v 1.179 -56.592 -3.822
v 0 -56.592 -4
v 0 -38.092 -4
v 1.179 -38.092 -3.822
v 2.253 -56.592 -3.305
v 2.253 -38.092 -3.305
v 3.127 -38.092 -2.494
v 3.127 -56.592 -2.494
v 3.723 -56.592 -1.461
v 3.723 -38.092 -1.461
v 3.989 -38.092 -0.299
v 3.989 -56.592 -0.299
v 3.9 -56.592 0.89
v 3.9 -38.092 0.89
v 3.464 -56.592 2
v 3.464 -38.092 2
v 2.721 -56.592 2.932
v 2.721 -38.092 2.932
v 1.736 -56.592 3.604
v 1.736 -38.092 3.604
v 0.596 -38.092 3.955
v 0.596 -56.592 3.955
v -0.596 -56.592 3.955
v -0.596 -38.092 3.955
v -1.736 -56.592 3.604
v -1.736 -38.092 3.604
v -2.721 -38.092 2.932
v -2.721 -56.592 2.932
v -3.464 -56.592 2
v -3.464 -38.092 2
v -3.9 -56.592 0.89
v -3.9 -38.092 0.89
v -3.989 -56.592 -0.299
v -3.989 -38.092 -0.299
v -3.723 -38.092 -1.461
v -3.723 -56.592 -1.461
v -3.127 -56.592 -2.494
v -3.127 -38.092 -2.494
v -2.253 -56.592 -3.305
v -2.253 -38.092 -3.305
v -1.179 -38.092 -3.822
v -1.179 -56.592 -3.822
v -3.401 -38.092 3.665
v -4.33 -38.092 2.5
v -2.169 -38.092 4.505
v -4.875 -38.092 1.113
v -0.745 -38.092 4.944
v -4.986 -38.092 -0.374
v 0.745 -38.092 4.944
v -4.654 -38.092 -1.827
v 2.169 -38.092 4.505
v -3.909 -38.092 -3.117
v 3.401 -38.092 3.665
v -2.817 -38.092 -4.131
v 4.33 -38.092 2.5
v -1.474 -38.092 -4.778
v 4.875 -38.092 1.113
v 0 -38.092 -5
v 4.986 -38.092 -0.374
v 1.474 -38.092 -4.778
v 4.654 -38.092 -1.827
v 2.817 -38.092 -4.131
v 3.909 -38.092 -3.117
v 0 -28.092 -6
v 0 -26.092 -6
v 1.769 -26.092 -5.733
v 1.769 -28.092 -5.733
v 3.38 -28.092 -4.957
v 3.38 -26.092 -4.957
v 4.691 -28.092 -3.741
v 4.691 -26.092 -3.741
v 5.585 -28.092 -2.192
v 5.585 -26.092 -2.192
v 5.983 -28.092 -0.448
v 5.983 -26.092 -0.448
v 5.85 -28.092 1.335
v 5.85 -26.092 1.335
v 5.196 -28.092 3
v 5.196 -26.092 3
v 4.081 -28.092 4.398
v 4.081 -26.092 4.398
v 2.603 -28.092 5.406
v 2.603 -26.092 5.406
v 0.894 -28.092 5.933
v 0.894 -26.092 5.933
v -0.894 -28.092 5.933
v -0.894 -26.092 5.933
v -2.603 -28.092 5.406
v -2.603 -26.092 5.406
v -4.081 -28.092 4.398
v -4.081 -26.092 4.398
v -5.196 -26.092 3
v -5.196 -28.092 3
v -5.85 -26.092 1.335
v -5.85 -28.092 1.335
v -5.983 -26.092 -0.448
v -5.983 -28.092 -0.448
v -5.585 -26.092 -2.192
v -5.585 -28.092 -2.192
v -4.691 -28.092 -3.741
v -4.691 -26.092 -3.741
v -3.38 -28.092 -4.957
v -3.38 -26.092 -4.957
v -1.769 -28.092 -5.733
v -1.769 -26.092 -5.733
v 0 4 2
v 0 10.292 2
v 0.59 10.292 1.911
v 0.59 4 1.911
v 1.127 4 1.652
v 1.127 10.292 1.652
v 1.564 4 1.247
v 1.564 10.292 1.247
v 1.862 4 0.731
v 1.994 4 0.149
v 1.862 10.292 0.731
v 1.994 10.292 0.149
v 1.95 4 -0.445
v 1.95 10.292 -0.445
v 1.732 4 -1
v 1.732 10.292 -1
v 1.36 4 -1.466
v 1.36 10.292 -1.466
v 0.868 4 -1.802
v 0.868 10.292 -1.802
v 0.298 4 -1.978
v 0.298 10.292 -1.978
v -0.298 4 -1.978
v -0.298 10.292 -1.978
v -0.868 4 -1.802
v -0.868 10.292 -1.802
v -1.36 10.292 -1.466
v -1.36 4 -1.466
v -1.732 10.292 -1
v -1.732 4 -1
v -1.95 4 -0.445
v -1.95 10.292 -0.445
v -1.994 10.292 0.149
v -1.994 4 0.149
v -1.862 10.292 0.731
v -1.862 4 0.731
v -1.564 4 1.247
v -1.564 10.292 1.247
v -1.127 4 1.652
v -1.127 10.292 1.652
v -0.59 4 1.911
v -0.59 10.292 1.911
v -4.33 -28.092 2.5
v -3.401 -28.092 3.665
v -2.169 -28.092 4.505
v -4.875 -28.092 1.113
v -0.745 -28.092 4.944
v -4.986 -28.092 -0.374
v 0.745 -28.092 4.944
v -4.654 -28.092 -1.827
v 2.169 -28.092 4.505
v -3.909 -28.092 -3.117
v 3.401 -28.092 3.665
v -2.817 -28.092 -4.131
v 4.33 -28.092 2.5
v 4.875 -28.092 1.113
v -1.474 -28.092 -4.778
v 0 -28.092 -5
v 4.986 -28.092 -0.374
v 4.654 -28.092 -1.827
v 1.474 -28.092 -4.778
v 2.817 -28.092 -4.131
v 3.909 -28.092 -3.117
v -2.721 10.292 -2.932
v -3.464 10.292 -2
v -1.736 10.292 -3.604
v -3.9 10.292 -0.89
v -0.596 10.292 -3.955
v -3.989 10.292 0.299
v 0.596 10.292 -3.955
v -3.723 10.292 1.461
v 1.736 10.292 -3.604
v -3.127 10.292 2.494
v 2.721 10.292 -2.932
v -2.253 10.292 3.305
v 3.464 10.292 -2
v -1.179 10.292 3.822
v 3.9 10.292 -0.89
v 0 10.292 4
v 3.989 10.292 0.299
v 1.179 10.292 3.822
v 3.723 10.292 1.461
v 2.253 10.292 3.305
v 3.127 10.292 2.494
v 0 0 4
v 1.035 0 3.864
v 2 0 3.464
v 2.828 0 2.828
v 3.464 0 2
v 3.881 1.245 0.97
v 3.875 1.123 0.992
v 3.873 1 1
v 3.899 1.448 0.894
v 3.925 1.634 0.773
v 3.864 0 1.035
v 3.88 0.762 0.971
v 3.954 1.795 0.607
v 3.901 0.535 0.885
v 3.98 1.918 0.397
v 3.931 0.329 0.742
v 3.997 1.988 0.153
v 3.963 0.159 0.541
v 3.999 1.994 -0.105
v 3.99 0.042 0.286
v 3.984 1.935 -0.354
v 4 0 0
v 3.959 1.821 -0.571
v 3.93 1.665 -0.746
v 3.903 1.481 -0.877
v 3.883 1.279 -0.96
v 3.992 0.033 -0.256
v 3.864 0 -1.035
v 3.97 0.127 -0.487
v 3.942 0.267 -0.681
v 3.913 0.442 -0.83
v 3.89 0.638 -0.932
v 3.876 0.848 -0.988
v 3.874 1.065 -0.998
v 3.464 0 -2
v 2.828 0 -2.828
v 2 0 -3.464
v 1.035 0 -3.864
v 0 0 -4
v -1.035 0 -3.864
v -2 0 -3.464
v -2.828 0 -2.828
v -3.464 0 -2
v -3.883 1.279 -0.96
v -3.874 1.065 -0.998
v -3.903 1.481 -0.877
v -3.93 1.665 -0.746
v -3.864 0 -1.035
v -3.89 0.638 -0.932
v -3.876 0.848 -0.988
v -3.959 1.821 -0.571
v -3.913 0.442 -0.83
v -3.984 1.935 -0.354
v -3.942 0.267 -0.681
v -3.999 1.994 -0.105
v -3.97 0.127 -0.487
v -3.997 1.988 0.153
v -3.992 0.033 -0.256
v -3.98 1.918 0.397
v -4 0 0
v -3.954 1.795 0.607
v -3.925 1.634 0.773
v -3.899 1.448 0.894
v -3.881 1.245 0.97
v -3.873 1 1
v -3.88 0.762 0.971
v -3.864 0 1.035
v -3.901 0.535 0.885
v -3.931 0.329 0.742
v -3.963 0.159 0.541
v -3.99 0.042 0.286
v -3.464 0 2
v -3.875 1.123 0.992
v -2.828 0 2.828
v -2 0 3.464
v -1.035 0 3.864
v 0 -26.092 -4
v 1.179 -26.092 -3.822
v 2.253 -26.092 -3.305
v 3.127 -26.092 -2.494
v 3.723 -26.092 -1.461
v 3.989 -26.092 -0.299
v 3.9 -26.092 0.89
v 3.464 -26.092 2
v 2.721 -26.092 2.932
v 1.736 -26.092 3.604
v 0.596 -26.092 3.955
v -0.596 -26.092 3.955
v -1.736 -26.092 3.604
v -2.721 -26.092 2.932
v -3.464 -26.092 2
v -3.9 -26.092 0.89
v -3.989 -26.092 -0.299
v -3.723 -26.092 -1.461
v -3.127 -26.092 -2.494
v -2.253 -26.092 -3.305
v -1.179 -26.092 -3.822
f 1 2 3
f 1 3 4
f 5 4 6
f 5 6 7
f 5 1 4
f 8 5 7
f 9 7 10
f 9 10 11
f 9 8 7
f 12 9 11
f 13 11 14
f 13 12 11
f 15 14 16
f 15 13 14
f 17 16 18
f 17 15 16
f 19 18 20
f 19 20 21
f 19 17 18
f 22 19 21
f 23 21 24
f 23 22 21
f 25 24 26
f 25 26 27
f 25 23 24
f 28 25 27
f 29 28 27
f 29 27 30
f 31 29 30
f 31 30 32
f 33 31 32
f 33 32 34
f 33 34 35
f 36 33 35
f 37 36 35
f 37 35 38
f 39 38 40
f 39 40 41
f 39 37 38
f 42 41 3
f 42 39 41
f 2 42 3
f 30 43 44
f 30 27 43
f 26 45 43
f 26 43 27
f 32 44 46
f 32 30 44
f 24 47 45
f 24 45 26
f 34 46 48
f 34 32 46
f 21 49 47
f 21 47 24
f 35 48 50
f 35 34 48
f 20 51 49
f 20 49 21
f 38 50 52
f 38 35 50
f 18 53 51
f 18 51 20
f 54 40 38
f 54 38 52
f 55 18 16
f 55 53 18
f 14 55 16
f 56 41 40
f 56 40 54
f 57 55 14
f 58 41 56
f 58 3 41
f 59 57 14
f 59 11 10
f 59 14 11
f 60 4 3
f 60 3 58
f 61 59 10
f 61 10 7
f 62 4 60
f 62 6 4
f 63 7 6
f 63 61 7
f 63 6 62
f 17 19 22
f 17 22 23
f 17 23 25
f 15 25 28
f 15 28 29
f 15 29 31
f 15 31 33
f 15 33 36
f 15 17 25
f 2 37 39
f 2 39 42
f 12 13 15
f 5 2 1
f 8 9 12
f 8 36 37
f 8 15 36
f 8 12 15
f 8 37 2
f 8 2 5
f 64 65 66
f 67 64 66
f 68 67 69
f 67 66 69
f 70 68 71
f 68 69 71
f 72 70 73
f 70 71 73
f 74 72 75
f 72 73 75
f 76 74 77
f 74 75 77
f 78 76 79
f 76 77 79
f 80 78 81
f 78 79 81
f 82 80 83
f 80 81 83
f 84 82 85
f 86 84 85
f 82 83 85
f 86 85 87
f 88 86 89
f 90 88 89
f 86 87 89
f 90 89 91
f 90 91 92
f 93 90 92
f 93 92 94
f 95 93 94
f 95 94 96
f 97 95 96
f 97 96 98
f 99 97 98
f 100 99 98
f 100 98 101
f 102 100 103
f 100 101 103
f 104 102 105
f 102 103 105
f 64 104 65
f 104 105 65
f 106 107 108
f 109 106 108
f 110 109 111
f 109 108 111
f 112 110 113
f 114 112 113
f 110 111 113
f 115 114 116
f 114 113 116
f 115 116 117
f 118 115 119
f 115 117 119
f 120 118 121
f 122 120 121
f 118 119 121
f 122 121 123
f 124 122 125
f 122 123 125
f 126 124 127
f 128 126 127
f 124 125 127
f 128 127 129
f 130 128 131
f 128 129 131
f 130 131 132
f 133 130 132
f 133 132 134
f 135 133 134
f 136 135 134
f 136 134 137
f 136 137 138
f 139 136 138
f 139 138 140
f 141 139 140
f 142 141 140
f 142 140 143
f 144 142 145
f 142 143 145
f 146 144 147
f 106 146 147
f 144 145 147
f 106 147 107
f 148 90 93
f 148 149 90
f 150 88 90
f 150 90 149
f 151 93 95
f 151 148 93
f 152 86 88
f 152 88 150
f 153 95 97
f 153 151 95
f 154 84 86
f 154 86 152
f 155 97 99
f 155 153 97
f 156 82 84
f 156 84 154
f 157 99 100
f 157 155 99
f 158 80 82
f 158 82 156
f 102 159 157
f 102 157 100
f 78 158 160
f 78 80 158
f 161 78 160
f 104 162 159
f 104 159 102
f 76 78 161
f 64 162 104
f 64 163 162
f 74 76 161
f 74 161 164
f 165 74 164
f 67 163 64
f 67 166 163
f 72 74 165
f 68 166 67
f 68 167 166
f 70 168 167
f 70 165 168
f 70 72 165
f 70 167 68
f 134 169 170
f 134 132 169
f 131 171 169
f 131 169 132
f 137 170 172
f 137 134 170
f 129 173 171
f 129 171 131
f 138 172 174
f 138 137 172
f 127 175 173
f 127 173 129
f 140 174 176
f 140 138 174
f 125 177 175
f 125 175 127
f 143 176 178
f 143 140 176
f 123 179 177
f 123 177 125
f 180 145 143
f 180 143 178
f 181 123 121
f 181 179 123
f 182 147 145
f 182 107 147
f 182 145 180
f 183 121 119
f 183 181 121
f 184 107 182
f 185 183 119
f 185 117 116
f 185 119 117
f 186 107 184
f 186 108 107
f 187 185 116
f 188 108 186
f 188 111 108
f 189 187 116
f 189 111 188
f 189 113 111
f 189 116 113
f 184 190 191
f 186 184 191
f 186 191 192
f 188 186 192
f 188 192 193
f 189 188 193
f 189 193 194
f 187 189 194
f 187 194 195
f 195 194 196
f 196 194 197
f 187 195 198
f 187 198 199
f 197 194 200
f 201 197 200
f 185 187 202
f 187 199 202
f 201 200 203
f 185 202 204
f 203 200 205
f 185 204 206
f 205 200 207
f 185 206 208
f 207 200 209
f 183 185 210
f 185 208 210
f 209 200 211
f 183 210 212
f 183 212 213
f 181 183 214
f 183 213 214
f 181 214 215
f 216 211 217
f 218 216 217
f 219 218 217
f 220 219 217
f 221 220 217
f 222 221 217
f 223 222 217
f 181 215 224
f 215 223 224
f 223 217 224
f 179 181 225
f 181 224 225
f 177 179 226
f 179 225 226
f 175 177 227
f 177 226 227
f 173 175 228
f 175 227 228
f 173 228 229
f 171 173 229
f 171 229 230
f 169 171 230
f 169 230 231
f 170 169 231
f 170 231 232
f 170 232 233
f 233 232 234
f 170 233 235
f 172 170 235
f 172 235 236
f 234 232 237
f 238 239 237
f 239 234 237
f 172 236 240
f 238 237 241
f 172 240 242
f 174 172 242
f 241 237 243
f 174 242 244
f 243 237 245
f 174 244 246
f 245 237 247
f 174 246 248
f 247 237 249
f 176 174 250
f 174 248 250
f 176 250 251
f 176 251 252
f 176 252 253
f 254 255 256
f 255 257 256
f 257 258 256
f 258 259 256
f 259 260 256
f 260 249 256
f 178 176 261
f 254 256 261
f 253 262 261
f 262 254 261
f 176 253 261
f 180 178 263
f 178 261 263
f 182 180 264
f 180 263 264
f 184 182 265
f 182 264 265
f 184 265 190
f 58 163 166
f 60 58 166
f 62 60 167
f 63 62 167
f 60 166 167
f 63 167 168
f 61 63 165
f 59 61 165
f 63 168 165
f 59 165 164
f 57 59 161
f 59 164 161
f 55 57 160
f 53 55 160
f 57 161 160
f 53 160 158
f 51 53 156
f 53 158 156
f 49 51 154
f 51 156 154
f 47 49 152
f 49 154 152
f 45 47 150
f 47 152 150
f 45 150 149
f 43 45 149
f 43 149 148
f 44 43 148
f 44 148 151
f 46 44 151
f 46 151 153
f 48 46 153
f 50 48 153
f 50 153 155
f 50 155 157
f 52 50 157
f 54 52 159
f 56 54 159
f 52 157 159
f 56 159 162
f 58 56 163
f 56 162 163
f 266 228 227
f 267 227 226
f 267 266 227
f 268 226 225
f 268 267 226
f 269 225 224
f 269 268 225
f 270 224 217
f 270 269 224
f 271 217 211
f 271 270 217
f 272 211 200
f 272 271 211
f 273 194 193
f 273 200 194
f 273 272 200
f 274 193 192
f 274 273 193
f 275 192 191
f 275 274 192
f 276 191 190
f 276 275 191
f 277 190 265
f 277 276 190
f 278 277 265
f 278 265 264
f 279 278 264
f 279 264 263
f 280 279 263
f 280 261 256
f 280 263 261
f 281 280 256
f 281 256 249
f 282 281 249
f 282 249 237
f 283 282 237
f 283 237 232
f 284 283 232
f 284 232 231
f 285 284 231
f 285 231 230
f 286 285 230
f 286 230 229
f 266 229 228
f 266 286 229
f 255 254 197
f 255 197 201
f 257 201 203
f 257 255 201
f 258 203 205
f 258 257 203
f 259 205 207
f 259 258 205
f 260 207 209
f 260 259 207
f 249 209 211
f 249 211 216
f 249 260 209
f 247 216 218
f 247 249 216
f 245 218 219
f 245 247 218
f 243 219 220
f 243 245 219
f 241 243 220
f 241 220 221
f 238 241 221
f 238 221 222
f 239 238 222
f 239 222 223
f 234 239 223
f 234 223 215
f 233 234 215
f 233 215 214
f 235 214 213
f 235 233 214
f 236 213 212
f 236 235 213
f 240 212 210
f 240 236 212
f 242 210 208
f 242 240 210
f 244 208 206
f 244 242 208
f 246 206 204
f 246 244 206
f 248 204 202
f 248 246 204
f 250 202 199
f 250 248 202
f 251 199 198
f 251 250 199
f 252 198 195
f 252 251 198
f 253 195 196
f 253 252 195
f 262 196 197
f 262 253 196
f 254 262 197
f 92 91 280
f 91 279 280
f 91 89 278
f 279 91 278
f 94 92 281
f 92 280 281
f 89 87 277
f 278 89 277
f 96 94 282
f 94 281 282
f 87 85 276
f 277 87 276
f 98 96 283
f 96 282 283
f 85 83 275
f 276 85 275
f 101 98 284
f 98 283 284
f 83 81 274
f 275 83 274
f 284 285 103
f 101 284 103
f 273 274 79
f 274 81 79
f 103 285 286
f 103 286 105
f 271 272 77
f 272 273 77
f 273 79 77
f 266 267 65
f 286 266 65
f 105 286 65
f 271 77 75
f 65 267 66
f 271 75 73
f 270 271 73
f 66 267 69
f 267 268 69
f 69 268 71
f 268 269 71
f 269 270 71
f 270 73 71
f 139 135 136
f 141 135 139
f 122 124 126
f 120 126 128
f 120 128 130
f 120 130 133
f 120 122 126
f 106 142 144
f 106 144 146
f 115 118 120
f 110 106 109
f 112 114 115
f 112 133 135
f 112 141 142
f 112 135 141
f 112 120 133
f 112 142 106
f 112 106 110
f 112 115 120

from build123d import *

# Parameters (mm, degrees)
SKETCH1_R                = 4
IMPELLER_SECTION_DEPTH   = 10.2921875
SKETCH2_R                = 2
IMPELLER_BOLT_BORE_DEPTH = 6.2921875
SEAL_START               = 26.0921875
SKETCH3_R                = 4
SEAL_SECTION_DEPTH       = 26.0921875
DOWEL_HOLE_DEPTH         = 10
DOWEL_HOLE_DEPTH_BACK    = 10
SKETCH5_R                = 1
SKETCH6_R                = 6
BEARING_STOP_DEPTH       = 2
SKETCH8_R                = 5
BEARING_SECTION_DEPTH    = 10
BOSS_EXTRUDE4_START      = 18.5
SKETCH9_R                = 4
BOSS_EXTRUDE4_DEPTH      = 18.5


with BuildPart() as part:
    # Sketch1 → impeller section (new body)
    with BuildSketch(Plane(origin=(0, 0, 0), x_dir=(1, 0, 0), z_dir=(0, 1, 0))):
        with Locations(Location((0, 0, 0), (0, 0, 270))):
            Circle(SKETCH1_R)
    extrude(amount=IMPELLER_SECTION_DEPTH)

    # Sketch2 → impeller bolt bore (cut)
    with BuildSketch(Plane(origin=(0, 10.2921875, 0), x_dir=(1, 0, 0), z_dir=(0, 1, 0))):
        with Locations(Location((0, 0, 0), (0, 0, 270))):
            Circle(SKETCH2_R)
    extrude(amount=-IMPELLER_BOLT_BORE_DEPTH, mode=Mode.SUBTRACT)

    # Sketch3 → seal section (add)
    with BuildSketch(Plane(origin=(0, 0, 0), x_dir=(-1, 0, 0), z_dir=(0, -1, 0)).offset(SEAL_START)):
        with Locations(Location((0, 0, 0), (0, 0, 90))):
            Circle(SKETCH3_R)
    extrude(amount=-SEAL_SECTION_DEPTH)

    # Sketch5 → dowel hole (cut, two sides: drawn at the far end of the back side and taken through both)
    with BuildSketch(Plane(origin=(0, 0, 0), x_dir=(0, 0, -1), z_dir=(1, 0, 0)).offset(-DOWEL_HOLE_DEPTH_BACK)):
        with Locations(Location((0, 1, 0), (0, 0, 180))):
            Circle(SKETCH5_R)
    extrude(amount=DOWEL_HOLE_DEPTH + DOWEL_HOLE_DEPTH_BACK, mode=Mode.SUBTRACT)

    # Sketch6 → bearing stop (add)
    with BuildSketch(Plane.XZ.offset(26.0921875)):
        with Locations(Location((0, 0, 0), (0, 0, 270))):
            Circle(SKETCH6_R)
    extrude(amount=BEARING_STOP_DEPTH)

    # Sketch8 → bearing section (add)
    with BuildSketch(Plane.XZ.offset(28.0921875)):
        with Locations(Location((0, 0, 0), (0, 0, 270))):
            Circle(SKETCH8_R)
    extrude(amount=BEARING_SECTION_DEPTH)

    # Sketch9 → Boss-Extrude4 (add)
    with BuildSketch(Plane(origin=(0, -38.0921875, 0), x_dir=(-1, 0, 0), z_dir=(0, -1, 0)).offset(BOSS_EXTRUDE4_START)):
        with Locations(Location((0, 0, 0), (0, 0, 90))):
            Circle(SKETCH9_R)
    extrude(amount=-BOSS_EXTRUDE4_DEPTH)


solid = part.part
